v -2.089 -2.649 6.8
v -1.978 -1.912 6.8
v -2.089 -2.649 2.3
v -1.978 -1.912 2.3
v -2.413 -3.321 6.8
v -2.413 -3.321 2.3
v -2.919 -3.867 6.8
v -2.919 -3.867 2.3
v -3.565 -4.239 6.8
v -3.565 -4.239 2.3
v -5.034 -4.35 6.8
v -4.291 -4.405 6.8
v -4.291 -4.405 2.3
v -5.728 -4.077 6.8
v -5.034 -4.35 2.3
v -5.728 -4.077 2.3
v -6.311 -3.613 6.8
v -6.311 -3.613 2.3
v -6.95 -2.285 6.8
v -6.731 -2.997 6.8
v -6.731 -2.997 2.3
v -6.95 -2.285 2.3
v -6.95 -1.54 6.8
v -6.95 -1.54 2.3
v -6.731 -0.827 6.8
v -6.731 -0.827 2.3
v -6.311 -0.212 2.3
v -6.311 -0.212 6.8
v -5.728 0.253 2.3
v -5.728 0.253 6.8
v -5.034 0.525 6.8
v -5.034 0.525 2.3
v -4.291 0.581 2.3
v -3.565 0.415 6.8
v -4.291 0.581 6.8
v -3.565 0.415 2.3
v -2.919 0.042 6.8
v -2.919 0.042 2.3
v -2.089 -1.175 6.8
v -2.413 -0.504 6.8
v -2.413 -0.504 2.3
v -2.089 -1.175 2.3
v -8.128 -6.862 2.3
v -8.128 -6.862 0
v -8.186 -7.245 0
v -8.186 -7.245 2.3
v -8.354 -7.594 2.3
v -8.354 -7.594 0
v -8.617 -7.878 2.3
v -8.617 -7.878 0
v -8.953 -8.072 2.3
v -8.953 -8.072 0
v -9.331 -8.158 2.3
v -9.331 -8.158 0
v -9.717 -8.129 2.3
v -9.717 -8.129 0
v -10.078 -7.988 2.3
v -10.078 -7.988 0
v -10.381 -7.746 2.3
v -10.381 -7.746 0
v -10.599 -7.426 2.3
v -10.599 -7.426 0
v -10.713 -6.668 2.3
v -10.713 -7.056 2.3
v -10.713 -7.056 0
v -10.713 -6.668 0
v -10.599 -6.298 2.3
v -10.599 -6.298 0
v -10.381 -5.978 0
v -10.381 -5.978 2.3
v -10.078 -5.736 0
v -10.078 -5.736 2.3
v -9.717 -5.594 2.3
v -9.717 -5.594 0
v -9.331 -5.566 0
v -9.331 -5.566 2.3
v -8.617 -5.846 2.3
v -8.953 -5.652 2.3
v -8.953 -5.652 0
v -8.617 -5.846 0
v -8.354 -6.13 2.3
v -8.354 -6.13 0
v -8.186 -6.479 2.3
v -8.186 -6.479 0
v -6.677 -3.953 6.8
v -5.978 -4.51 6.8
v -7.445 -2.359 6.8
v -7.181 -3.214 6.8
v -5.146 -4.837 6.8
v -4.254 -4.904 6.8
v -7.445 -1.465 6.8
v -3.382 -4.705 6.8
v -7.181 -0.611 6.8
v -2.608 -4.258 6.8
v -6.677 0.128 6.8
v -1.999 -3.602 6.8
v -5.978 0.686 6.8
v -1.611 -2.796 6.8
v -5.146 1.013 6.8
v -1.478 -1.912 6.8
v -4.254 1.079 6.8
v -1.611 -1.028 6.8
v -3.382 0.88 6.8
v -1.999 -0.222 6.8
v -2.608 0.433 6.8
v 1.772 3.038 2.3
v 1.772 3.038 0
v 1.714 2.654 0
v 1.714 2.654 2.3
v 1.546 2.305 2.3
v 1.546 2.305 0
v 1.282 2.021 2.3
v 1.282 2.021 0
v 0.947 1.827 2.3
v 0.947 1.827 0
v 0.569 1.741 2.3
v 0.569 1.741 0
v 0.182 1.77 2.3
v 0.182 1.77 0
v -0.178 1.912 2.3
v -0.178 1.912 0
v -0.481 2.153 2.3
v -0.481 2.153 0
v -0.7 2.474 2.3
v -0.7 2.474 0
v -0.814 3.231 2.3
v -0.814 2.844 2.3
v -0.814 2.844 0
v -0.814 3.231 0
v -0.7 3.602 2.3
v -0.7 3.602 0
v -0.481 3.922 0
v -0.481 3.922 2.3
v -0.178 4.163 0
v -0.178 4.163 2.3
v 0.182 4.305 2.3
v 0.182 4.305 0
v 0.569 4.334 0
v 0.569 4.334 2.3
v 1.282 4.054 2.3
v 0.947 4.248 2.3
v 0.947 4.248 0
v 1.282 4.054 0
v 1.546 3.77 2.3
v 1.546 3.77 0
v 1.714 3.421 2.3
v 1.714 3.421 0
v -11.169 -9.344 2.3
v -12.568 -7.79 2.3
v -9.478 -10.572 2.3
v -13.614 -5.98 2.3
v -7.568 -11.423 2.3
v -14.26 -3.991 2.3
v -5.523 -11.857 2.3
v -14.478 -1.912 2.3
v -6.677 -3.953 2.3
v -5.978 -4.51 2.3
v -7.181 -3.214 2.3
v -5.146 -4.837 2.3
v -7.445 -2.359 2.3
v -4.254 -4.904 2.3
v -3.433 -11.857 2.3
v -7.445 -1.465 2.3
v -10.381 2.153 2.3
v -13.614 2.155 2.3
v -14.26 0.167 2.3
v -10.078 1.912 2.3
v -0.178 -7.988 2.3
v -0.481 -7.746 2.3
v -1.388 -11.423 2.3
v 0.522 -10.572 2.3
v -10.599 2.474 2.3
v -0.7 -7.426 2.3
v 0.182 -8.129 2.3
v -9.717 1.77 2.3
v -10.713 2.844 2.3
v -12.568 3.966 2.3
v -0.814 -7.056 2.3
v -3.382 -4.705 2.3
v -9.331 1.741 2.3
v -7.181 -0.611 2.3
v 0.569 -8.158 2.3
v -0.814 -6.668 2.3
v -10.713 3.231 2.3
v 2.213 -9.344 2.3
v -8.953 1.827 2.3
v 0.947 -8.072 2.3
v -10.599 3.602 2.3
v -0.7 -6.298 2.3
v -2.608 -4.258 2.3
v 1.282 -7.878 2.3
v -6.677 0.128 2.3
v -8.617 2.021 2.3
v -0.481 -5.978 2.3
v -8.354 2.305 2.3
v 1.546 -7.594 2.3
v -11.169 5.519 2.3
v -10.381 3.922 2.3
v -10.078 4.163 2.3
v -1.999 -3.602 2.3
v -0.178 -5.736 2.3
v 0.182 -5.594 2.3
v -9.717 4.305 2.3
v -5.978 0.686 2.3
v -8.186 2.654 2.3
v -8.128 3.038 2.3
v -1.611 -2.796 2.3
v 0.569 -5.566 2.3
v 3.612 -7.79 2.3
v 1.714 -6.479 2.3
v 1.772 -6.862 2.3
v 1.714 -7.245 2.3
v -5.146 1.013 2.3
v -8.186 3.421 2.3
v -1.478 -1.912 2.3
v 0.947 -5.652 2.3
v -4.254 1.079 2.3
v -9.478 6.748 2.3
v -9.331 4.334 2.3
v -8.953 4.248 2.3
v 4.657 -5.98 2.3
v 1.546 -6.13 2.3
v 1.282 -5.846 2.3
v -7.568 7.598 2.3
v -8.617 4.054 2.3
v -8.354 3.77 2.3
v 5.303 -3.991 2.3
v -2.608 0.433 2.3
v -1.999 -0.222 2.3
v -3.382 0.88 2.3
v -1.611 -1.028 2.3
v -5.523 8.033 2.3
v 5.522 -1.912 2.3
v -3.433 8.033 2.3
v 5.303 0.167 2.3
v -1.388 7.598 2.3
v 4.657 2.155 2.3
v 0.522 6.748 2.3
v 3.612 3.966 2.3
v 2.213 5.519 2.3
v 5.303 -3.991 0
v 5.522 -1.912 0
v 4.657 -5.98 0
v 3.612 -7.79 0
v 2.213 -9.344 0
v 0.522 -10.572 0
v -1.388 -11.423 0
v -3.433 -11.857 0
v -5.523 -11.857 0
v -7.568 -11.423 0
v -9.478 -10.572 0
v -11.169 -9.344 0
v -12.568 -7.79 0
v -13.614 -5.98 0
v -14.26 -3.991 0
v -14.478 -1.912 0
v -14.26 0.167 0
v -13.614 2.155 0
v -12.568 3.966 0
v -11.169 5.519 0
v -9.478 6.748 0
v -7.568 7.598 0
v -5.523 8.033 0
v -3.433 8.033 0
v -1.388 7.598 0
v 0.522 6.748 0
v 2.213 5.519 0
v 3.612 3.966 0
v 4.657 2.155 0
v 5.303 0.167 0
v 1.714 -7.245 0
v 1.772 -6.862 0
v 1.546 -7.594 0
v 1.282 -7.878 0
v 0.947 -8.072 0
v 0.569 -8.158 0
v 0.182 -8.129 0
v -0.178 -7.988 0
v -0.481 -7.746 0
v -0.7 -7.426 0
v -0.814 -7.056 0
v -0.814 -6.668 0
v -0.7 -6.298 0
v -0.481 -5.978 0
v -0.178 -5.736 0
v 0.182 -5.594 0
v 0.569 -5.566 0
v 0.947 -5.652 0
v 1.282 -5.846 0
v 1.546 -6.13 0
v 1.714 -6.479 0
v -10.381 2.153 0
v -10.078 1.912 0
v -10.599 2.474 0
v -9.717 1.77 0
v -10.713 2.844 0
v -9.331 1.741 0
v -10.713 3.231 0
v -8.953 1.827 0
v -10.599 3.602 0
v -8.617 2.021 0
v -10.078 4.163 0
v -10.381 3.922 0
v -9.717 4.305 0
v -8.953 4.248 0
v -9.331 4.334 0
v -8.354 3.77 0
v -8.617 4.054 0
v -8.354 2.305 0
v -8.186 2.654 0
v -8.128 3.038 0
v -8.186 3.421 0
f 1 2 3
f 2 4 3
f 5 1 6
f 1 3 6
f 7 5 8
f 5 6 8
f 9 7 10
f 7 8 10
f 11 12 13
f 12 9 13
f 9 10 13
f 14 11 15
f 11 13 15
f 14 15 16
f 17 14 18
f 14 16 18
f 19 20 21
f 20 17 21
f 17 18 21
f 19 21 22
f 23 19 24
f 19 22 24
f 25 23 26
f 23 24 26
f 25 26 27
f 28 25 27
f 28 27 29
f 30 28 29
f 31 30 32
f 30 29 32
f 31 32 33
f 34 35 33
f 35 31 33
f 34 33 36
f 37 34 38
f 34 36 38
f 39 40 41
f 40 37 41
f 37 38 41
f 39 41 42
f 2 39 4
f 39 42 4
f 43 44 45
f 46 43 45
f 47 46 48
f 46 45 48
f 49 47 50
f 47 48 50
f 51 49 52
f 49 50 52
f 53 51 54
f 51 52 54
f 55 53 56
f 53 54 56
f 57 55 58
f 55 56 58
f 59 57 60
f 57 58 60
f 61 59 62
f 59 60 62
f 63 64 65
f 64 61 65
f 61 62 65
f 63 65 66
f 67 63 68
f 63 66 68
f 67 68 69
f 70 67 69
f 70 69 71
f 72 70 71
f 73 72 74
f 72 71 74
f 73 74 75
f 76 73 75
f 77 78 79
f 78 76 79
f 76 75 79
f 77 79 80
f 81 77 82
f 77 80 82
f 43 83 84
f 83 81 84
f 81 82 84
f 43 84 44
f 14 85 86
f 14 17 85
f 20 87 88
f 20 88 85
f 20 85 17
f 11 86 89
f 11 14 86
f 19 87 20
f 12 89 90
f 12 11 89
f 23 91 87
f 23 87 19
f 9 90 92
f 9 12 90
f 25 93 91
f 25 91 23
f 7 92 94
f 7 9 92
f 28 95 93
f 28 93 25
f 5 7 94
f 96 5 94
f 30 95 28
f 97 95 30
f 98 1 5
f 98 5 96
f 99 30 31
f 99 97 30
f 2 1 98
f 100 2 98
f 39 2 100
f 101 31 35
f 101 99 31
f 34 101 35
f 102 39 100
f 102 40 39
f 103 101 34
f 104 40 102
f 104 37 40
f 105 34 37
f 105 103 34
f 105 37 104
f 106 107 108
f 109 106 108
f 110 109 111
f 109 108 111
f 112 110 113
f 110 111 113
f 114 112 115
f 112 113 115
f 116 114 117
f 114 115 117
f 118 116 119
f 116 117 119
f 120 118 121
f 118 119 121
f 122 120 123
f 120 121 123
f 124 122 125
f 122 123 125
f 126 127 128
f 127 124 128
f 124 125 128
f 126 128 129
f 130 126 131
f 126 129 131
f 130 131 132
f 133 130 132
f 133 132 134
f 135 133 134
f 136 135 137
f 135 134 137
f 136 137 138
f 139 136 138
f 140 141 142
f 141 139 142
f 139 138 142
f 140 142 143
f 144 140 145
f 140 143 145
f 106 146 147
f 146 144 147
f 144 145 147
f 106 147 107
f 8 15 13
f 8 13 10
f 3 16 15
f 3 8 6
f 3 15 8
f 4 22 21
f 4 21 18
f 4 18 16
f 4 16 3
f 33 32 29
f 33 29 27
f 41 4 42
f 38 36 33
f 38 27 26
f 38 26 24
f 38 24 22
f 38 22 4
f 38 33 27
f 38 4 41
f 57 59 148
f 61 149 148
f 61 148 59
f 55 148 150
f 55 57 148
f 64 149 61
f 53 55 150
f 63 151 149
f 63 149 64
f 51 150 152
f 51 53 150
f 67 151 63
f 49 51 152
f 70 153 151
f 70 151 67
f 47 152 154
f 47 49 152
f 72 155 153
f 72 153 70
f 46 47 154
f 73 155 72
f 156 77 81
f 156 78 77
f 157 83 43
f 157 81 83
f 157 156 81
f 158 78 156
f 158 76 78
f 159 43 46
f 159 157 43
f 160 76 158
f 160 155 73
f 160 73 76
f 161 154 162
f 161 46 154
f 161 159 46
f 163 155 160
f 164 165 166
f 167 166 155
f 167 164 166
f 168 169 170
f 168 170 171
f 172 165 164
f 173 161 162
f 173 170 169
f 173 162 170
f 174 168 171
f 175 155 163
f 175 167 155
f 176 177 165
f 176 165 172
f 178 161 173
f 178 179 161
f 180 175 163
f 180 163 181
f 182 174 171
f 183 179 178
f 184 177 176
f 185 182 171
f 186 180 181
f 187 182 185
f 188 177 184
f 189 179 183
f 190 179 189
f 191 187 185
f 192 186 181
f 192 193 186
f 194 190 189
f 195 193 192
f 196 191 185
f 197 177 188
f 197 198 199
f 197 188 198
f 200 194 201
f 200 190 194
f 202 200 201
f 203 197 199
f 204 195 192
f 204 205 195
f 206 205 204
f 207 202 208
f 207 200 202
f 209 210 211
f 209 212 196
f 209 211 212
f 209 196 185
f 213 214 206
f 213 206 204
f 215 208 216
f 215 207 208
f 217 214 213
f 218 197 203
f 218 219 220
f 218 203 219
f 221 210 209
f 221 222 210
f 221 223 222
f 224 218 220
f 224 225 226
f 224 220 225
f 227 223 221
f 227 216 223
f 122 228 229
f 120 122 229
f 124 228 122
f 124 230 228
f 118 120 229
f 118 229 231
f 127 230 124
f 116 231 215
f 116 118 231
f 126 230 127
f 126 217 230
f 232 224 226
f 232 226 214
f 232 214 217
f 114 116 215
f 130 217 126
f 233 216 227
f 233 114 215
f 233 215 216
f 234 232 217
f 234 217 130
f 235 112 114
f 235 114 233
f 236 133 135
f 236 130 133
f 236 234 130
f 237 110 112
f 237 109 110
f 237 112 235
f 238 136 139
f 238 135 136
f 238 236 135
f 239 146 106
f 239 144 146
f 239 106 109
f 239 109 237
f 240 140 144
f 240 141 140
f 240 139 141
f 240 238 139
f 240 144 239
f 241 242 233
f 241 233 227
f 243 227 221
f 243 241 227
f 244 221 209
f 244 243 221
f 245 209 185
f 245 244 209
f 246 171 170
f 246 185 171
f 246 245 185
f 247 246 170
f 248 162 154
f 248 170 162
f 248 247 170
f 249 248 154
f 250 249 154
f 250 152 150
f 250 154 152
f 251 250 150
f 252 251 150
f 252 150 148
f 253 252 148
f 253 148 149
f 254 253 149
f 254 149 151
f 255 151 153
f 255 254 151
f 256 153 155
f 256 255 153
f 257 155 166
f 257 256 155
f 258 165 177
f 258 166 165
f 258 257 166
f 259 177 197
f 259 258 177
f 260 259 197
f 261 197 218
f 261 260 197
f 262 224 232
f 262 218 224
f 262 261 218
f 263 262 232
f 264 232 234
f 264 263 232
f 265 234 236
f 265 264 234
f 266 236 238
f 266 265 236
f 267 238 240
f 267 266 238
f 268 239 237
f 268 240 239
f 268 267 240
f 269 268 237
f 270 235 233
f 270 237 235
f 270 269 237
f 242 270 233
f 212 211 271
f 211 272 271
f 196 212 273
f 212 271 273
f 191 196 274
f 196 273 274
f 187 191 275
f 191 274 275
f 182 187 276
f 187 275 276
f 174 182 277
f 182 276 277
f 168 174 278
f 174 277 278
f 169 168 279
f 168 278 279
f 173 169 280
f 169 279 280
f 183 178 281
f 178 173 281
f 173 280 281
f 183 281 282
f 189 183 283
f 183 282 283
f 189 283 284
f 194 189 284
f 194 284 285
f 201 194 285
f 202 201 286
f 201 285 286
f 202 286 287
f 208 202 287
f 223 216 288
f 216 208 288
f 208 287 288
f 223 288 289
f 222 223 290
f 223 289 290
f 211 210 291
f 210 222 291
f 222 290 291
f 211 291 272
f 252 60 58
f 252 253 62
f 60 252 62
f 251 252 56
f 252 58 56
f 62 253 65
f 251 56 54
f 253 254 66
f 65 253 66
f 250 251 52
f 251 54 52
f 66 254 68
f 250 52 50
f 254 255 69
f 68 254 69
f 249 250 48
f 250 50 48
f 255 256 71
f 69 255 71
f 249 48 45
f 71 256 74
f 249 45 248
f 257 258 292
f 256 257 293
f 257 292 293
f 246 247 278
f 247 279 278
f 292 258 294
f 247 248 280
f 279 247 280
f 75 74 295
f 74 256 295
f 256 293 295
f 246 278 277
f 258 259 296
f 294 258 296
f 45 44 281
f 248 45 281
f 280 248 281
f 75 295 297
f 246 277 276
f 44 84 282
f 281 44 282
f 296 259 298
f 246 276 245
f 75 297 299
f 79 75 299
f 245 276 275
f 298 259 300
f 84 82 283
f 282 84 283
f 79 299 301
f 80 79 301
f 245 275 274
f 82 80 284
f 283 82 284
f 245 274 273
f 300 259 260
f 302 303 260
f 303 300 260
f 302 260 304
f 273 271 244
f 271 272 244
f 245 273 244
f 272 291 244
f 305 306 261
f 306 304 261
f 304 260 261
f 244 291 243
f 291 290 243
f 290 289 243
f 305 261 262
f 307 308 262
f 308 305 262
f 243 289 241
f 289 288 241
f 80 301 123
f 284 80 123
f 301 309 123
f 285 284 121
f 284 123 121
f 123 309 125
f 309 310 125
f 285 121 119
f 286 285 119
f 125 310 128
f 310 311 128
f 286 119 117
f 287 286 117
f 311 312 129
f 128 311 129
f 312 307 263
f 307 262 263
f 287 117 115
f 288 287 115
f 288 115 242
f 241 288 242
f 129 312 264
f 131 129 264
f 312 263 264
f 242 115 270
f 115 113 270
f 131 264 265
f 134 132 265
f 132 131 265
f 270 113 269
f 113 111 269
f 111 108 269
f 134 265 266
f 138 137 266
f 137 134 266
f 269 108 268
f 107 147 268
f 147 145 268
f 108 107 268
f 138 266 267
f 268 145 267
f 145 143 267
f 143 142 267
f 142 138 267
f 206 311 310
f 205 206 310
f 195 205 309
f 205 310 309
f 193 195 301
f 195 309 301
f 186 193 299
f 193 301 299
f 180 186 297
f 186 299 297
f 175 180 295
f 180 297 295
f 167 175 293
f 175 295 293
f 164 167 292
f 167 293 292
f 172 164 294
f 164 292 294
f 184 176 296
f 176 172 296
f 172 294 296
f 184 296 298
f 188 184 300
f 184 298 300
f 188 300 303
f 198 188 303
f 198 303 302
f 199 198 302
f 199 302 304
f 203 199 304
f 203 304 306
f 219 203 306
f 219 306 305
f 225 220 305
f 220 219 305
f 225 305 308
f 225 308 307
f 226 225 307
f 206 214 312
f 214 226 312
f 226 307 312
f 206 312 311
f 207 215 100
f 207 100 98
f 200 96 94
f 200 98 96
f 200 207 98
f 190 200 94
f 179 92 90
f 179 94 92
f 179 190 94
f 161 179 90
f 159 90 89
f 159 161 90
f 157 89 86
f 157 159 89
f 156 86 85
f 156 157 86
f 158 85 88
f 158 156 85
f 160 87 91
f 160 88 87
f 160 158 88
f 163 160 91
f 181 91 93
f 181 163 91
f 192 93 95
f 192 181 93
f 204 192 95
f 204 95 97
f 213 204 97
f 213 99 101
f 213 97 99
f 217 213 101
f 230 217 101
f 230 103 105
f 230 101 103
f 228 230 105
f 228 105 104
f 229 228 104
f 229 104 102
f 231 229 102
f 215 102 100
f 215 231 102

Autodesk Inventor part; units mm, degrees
ref_plane "YZ Plane" through (0, 0, 0) normal (1, 0, 0) x (0, 1, 0)
ref_plane "XZ Plane" through (0, 0, 0) normal (0, 1, 0) x (-1, 0, 0)
ref_plane "XY Plane" through (0, 0, 0) normal (0, 0, 1) x (1, 0, 0)
sketch "스케치1" plane through (0, 0, 0) normal (0, 0, 1) x (1, 0, 0)
  circle A0 centre (0.4717, -6.8619) radius 1.3
  circle A1 centre (0.4717, 3.0376) radius 1.3
  circle A2 centre (-9.4278, 3.0376) radius 1.3
  circle A3 centre (-9.4278, -6.8619) radius 1.3
  circle A4 centre (-4.4781, -1.9122) radius 10
  circle A5 centre (-4.4781, -1.9122) radius 5.5
  circle A6 centre (-4.4781, -1.9122) radius 10 projected
  circle A7 centre (0.4717, -6.8619) radius 1.3 projected
  circle A8 centre (0.4717, 3.0376) radius 1.3 projected
  circle A9 centre (-9.4278, 3.0376) radius 1.3 projected
  circle A10 centre (-9.4278, -6.8619) radius 1.3 projected
  point P0 (0, 0)
  dimension "d6" = 20
  dimension "d7" = 11
  dimension "d8" = 2.6
  dimension "d9" = 2.6
  dimension "d10" = 2.6
  dimension "d11" = 2.6
extrude "돌출1" add sketch "스케치1" along normal blind 2.3 contours A4 | A5
sketch "스케치2" plane through (-4.4781, -1.9122, 2.3) normal (0, 0, 1) x (1, 0, 0)
  circle A0 centre (0, 0) radius 10 projected
  circle A1 centre (0, 0) radius 3
  circle A2 centre (0, 0) radius 2.5
  dimension "d2" = 6
  dimension "d5" = 5
extrude "돌출2" add sketch "스케치2" along normal blind 4.5 contours A1
properties part number "pitch_motor1" material "고무, 검은색"
